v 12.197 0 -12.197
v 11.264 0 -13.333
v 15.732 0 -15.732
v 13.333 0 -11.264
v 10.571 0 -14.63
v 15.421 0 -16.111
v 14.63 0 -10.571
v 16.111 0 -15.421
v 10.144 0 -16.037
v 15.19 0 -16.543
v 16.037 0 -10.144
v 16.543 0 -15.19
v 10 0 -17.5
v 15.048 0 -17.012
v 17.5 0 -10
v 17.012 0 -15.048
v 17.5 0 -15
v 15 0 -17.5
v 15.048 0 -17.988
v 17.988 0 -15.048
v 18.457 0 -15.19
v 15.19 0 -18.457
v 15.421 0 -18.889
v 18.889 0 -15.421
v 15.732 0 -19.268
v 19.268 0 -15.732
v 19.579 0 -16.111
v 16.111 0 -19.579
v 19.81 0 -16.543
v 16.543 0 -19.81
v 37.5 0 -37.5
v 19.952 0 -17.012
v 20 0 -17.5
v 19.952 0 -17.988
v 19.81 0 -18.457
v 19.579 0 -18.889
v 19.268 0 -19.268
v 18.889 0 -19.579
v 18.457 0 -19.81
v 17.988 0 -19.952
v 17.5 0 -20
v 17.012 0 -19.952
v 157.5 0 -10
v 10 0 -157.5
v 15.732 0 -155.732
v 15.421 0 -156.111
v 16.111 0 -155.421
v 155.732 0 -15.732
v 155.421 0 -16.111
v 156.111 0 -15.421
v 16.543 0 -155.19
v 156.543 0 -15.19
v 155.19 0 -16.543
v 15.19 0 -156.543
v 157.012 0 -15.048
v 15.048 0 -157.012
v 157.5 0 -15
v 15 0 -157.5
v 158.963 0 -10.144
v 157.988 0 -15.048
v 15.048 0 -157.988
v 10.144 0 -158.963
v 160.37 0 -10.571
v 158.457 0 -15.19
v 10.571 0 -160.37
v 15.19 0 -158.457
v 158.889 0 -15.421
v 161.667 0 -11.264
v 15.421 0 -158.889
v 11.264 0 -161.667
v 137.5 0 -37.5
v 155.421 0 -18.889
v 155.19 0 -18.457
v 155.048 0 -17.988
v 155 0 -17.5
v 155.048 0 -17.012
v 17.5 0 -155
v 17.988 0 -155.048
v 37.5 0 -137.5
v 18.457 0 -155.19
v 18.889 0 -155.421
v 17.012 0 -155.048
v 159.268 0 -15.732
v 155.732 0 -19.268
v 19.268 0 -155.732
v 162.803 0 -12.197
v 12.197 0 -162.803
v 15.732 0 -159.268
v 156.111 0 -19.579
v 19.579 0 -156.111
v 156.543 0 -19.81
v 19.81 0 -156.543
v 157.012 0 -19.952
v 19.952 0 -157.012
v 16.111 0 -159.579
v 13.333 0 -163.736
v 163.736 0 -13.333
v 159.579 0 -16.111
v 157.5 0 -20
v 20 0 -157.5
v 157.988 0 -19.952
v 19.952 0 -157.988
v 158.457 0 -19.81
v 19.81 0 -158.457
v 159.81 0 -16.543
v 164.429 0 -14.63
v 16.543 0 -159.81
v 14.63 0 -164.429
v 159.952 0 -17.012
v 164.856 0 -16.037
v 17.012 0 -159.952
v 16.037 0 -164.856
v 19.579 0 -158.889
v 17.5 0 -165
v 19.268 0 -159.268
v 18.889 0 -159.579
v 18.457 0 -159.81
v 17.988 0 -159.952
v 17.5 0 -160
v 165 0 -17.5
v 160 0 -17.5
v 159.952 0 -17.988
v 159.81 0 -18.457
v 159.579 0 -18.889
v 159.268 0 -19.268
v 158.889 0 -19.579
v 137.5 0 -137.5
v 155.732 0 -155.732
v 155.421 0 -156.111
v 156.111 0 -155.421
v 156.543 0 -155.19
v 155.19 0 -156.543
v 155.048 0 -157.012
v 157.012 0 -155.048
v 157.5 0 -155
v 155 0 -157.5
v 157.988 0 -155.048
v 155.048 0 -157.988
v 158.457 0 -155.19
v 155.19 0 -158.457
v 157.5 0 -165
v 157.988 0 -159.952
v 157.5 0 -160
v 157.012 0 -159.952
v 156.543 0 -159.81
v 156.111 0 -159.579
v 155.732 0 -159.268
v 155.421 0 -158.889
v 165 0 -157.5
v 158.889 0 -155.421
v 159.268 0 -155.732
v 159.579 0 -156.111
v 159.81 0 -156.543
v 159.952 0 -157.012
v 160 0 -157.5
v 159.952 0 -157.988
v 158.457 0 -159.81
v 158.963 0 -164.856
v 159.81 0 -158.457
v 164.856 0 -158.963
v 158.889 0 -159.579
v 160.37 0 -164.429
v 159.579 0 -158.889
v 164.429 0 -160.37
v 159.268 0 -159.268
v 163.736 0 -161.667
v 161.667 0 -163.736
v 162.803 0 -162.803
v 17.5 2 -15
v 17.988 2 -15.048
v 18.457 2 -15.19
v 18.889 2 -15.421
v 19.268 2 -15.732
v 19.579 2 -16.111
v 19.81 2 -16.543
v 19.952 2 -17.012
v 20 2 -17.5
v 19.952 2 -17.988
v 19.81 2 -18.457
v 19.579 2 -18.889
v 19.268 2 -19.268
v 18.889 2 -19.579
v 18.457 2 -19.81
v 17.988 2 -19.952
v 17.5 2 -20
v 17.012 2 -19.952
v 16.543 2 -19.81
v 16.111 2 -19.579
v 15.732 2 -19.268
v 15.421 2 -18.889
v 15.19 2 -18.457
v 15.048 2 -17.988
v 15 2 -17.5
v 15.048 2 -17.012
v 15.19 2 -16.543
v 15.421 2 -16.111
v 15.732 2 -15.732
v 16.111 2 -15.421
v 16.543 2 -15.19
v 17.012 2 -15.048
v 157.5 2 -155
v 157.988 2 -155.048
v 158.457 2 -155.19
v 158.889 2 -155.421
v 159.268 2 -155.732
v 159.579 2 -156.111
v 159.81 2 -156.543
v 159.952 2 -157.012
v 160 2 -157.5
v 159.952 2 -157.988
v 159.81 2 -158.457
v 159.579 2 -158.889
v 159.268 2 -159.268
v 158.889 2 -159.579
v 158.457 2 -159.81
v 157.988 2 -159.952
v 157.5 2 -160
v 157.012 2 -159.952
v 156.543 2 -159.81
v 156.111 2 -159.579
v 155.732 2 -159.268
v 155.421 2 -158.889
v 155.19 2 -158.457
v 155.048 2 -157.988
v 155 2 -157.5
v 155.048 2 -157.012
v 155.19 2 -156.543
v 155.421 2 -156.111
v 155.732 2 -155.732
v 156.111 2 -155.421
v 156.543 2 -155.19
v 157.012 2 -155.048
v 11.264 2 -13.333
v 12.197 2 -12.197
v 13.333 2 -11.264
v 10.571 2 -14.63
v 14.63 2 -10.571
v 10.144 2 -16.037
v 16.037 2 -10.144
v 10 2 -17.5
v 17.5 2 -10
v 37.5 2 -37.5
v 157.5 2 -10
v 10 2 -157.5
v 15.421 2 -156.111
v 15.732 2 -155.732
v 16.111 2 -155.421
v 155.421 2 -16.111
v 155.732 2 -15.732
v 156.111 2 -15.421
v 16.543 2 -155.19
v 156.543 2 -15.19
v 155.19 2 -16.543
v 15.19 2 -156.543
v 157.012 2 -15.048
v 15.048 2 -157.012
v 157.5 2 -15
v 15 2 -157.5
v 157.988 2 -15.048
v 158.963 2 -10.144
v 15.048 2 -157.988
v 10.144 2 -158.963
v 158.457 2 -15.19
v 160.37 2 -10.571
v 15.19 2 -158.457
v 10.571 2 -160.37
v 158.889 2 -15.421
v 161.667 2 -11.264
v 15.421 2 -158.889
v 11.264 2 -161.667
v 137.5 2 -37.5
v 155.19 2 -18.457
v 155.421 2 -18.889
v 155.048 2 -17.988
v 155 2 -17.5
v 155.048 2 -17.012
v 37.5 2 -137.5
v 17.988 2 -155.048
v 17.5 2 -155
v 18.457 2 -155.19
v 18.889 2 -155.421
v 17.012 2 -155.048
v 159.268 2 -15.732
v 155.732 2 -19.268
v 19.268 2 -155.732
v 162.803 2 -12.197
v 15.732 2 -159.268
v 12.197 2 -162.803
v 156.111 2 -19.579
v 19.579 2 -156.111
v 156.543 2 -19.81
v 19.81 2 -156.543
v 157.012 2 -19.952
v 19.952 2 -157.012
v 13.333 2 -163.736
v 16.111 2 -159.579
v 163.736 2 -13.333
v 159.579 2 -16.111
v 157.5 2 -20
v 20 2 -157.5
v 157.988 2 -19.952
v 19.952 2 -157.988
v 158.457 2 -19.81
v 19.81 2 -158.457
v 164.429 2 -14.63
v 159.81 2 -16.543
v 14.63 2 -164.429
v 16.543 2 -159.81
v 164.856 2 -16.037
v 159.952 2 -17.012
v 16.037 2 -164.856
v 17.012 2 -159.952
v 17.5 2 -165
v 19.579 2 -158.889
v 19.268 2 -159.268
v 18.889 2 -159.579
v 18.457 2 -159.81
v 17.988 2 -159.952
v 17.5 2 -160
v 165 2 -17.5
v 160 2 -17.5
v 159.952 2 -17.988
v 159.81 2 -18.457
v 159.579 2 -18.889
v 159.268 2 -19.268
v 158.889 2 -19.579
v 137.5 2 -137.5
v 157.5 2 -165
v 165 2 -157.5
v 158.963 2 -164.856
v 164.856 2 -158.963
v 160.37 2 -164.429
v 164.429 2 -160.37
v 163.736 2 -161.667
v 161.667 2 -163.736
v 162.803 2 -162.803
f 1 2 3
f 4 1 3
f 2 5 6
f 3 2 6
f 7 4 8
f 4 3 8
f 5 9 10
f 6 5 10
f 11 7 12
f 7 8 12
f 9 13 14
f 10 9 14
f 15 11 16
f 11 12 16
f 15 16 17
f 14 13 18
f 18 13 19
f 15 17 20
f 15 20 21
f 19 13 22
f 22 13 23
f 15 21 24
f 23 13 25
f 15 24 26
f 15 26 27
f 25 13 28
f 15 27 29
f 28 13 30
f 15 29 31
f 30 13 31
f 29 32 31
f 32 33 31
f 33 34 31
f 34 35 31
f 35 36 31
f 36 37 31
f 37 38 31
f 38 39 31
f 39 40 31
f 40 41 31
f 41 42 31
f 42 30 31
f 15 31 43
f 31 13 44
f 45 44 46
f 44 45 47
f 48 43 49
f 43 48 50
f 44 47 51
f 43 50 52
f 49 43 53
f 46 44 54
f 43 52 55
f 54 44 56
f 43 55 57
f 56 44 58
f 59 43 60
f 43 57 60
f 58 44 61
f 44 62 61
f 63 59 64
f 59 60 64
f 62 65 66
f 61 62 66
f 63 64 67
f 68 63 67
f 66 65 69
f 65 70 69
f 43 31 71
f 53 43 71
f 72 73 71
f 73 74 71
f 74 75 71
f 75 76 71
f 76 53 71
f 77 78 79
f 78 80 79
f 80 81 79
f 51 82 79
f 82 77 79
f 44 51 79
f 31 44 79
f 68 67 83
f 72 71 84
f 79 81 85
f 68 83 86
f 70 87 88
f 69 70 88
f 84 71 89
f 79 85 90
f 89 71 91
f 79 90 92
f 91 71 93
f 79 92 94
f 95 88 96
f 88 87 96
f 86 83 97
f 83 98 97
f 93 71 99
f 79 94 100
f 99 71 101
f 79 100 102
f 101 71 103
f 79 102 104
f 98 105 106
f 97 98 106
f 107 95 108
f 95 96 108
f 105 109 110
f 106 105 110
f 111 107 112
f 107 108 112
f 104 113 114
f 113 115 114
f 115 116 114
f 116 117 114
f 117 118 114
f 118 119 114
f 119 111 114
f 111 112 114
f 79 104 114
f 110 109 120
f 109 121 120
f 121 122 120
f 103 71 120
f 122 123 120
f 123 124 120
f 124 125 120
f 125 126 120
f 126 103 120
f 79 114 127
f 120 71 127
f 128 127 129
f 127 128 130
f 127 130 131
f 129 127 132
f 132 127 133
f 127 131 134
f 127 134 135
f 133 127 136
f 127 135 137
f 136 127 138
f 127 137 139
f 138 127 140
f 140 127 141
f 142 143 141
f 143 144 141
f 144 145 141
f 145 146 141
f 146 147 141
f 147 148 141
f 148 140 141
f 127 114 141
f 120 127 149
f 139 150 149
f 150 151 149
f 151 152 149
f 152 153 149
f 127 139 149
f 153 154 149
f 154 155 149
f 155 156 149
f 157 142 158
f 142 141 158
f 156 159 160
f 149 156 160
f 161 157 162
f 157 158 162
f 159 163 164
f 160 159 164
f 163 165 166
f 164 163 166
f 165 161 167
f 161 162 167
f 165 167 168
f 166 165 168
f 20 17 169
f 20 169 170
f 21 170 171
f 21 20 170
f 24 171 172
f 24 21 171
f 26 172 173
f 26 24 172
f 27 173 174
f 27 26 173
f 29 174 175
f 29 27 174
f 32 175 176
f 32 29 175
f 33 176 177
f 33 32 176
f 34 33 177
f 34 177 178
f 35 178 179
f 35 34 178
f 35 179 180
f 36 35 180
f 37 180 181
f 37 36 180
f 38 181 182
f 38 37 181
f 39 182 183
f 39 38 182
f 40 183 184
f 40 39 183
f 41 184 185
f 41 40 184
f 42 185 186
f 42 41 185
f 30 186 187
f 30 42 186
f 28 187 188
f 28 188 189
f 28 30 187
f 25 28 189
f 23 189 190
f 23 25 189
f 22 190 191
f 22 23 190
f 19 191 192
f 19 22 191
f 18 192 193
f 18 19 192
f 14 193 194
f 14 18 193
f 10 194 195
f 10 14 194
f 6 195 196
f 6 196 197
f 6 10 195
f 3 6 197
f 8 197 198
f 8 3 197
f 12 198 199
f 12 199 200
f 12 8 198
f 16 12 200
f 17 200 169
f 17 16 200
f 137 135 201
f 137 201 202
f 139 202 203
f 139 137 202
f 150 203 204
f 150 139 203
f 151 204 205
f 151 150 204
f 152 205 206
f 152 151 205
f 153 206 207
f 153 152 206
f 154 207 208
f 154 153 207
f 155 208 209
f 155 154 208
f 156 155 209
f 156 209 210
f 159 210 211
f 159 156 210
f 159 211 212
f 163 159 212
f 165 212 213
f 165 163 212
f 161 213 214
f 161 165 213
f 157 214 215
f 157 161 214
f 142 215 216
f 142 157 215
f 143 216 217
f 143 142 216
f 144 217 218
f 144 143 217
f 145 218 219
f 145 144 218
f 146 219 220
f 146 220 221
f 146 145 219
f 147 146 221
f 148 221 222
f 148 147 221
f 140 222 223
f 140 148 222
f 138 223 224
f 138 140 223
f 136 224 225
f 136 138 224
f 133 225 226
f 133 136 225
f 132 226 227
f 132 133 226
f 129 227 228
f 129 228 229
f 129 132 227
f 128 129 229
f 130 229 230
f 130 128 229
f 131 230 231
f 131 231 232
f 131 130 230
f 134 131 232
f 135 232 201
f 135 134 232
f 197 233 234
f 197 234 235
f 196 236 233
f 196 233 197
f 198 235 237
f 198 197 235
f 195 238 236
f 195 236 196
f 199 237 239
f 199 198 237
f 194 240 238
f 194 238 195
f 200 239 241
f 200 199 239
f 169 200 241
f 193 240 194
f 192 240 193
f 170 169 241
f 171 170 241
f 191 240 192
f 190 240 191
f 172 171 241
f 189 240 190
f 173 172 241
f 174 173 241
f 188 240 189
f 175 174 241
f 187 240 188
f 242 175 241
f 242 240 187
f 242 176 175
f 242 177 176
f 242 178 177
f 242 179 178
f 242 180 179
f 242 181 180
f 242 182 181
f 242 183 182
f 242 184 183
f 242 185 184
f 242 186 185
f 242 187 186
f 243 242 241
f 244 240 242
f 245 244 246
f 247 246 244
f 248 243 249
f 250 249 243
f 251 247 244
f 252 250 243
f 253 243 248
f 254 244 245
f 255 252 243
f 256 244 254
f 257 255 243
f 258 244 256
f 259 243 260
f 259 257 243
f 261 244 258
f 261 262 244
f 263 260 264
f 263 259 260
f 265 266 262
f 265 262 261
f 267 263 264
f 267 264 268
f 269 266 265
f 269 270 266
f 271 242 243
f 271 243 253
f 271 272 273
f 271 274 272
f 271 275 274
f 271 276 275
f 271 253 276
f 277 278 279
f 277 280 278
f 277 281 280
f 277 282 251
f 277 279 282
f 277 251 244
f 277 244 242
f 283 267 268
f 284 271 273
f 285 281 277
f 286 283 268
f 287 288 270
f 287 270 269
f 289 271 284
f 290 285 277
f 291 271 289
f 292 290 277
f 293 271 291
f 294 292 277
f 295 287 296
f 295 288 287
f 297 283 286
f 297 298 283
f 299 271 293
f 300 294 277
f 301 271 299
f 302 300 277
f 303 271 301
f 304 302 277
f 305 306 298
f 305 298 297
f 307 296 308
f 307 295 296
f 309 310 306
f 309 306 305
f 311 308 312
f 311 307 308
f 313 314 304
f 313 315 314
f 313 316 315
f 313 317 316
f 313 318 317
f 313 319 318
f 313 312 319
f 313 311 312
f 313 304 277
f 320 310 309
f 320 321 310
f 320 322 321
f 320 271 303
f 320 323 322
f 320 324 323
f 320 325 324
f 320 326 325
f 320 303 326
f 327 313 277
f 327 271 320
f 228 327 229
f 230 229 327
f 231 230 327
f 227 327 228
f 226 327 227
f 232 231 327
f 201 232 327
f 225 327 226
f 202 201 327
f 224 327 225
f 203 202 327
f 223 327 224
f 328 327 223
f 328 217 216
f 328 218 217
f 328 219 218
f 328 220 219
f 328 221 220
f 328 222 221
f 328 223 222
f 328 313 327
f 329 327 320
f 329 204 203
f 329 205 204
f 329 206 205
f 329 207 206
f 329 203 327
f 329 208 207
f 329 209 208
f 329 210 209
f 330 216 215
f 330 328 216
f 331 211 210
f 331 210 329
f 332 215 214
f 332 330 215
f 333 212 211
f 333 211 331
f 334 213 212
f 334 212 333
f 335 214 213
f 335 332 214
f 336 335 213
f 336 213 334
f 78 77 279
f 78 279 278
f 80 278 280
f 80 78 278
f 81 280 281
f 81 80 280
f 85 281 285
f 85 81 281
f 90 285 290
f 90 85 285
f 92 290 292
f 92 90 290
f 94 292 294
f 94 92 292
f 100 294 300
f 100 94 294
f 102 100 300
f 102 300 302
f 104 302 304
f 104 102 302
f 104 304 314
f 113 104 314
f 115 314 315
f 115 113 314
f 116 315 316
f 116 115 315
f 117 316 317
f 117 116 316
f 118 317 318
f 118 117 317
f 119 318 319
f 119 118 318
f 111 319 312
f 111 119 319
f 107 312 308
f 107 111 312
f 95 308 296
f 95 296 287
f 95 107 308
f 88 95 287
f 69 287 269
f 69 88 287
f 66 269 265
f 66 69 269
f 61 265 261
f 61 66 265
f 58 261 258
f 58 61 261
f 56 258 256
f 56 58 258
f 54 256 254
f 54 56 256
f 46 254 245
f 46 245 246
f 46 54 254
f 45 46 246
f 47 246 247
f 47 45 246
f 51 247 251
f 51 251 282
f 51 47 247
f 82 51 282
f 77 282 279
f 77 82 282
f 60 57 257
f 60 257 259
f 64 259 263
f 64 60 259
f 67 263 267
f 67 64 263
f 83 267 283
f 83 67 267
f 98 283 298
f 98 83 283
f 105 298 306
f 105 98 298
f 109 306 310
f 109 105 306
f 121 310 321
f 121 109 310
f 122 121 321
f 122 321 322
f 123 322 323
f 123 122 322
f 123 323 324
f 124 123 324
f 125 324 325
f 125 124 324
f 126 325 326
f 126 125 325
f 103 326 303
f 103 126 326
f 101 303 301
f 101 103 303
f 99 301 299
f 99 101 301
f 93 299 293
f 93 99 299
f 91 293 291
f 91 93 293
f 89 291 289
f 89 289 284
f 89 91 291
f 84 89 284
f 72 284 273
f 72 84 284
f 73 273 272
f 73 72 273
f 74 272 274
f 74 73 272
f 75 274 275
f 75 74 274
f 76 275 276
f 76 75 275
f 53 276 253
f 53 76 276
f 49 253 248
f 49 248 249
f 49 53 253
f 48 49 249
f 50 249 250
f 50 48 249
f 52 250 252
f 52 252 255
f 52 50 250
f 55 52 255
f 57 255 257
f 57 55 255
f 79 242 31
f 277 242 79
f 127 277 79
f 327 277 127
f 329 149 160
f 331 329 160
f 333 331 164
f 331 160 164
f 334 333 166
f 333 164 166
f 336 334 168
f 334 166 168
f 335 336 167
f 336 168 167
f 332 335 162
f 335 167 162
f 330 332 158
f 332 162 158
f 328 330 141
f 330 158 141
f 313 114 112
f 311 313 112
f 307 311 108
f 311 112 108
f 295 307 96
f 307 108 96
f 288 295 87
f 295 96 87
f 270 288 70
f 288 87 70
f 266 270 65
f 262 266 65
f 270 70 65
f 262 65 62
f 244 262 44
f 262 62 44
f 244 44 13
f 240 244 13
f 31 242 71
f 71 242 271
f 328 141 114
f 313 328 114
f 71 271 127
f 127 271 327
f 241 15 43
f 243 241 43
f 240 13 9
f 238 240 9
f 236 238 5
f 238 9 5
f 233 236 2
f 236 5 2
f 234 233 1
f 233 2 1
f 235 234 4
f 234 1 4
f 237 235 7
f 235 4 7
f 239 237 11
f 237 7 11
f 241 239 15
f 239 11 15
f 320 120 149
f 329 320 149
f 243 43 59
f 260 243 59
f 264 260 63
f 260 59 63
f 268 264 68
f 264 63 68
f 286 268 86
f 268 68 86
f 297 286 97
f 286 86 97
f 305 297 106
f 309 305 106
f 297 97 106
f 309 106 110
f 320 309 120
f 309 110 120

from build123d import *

# Parameters (mm, degrees)
CROQUIS1_R              = 2.5
SALIENTE_EXTRUIR1_DEPTH = 2
CROQUIS2_W              = 100
CROQUIS2_H              = 100
CORTAR_EXTRUIR1_DEPTH   = 10


with BuildPart() as part:
    # Croquis1 → Saliente-Extruir1 (new body)
    with BuildSketch(Plane(origin=(0, 0, 0), x_dir=(1, 0, 0), z_dir=(0, 1, 0))):
        with BuildLine():
            Line((17.5, 10), (157.5, 10))
            ThreePointArc((157.5, 10), (162.803300859, 12.196699141), (165, 17.5))
            Line((165, 17.5), (165, 157.5))
            ThreePointArc((165, 157.5), (162.803300859, 162.803300859), (157.5, 165))
            Line((157.5, 165), (17.5, 165))
            ThreePointArc((17.5, 165), (12.196699141, 162.803300859), (10, 157.5))
            Line((10, 157.5), (10, 17.5))
            ThreePointArc((10, 17.5), (12.196699141, 12.196699141), (17.5, 10))
        make_face()
        with Locations(Location((17.5, 157.5, 0), (0, 0, 270))):
            Circle(CROQUIS1_R, mode=Mode.SUBTRACT)
        with Locations(Location((157.5, 157.5, 0), (0, 0, 270))):
            Circle(CROQUIS1_R, mode=Mode.SUBTRACT)
        with Locations(Location((157.5, 17.5, 0), (0, 0, 270))):
            Circle(CROQUIS1_R, mode=Mode.SUBTRACT)
        with Locations(Location((17.5, 17.5, 0), (0, 0, 270))):
            Circle(CROQUIS1_R, mode=Mode.SUBTRACT)
    extrude(amount=SALIENTE_EXTRUIR1_DEPTH)

    # Croquis2 → Cortar-Extruir1 (cut)
    with BuildSketch(Plane(origin=(0, 2, 0), x_dir=(1, 0, 0), z_dir=(0, 1, 0))):
        with Locations((87.5, 87.5)):
            Rectangle(CROQUIS2_W, CROQUIS2_H)
    extrude(amount=-CORTAR_EXTRUIR1_DEPTH, mode=Mode.SUBTRACT)


solid = part.part
